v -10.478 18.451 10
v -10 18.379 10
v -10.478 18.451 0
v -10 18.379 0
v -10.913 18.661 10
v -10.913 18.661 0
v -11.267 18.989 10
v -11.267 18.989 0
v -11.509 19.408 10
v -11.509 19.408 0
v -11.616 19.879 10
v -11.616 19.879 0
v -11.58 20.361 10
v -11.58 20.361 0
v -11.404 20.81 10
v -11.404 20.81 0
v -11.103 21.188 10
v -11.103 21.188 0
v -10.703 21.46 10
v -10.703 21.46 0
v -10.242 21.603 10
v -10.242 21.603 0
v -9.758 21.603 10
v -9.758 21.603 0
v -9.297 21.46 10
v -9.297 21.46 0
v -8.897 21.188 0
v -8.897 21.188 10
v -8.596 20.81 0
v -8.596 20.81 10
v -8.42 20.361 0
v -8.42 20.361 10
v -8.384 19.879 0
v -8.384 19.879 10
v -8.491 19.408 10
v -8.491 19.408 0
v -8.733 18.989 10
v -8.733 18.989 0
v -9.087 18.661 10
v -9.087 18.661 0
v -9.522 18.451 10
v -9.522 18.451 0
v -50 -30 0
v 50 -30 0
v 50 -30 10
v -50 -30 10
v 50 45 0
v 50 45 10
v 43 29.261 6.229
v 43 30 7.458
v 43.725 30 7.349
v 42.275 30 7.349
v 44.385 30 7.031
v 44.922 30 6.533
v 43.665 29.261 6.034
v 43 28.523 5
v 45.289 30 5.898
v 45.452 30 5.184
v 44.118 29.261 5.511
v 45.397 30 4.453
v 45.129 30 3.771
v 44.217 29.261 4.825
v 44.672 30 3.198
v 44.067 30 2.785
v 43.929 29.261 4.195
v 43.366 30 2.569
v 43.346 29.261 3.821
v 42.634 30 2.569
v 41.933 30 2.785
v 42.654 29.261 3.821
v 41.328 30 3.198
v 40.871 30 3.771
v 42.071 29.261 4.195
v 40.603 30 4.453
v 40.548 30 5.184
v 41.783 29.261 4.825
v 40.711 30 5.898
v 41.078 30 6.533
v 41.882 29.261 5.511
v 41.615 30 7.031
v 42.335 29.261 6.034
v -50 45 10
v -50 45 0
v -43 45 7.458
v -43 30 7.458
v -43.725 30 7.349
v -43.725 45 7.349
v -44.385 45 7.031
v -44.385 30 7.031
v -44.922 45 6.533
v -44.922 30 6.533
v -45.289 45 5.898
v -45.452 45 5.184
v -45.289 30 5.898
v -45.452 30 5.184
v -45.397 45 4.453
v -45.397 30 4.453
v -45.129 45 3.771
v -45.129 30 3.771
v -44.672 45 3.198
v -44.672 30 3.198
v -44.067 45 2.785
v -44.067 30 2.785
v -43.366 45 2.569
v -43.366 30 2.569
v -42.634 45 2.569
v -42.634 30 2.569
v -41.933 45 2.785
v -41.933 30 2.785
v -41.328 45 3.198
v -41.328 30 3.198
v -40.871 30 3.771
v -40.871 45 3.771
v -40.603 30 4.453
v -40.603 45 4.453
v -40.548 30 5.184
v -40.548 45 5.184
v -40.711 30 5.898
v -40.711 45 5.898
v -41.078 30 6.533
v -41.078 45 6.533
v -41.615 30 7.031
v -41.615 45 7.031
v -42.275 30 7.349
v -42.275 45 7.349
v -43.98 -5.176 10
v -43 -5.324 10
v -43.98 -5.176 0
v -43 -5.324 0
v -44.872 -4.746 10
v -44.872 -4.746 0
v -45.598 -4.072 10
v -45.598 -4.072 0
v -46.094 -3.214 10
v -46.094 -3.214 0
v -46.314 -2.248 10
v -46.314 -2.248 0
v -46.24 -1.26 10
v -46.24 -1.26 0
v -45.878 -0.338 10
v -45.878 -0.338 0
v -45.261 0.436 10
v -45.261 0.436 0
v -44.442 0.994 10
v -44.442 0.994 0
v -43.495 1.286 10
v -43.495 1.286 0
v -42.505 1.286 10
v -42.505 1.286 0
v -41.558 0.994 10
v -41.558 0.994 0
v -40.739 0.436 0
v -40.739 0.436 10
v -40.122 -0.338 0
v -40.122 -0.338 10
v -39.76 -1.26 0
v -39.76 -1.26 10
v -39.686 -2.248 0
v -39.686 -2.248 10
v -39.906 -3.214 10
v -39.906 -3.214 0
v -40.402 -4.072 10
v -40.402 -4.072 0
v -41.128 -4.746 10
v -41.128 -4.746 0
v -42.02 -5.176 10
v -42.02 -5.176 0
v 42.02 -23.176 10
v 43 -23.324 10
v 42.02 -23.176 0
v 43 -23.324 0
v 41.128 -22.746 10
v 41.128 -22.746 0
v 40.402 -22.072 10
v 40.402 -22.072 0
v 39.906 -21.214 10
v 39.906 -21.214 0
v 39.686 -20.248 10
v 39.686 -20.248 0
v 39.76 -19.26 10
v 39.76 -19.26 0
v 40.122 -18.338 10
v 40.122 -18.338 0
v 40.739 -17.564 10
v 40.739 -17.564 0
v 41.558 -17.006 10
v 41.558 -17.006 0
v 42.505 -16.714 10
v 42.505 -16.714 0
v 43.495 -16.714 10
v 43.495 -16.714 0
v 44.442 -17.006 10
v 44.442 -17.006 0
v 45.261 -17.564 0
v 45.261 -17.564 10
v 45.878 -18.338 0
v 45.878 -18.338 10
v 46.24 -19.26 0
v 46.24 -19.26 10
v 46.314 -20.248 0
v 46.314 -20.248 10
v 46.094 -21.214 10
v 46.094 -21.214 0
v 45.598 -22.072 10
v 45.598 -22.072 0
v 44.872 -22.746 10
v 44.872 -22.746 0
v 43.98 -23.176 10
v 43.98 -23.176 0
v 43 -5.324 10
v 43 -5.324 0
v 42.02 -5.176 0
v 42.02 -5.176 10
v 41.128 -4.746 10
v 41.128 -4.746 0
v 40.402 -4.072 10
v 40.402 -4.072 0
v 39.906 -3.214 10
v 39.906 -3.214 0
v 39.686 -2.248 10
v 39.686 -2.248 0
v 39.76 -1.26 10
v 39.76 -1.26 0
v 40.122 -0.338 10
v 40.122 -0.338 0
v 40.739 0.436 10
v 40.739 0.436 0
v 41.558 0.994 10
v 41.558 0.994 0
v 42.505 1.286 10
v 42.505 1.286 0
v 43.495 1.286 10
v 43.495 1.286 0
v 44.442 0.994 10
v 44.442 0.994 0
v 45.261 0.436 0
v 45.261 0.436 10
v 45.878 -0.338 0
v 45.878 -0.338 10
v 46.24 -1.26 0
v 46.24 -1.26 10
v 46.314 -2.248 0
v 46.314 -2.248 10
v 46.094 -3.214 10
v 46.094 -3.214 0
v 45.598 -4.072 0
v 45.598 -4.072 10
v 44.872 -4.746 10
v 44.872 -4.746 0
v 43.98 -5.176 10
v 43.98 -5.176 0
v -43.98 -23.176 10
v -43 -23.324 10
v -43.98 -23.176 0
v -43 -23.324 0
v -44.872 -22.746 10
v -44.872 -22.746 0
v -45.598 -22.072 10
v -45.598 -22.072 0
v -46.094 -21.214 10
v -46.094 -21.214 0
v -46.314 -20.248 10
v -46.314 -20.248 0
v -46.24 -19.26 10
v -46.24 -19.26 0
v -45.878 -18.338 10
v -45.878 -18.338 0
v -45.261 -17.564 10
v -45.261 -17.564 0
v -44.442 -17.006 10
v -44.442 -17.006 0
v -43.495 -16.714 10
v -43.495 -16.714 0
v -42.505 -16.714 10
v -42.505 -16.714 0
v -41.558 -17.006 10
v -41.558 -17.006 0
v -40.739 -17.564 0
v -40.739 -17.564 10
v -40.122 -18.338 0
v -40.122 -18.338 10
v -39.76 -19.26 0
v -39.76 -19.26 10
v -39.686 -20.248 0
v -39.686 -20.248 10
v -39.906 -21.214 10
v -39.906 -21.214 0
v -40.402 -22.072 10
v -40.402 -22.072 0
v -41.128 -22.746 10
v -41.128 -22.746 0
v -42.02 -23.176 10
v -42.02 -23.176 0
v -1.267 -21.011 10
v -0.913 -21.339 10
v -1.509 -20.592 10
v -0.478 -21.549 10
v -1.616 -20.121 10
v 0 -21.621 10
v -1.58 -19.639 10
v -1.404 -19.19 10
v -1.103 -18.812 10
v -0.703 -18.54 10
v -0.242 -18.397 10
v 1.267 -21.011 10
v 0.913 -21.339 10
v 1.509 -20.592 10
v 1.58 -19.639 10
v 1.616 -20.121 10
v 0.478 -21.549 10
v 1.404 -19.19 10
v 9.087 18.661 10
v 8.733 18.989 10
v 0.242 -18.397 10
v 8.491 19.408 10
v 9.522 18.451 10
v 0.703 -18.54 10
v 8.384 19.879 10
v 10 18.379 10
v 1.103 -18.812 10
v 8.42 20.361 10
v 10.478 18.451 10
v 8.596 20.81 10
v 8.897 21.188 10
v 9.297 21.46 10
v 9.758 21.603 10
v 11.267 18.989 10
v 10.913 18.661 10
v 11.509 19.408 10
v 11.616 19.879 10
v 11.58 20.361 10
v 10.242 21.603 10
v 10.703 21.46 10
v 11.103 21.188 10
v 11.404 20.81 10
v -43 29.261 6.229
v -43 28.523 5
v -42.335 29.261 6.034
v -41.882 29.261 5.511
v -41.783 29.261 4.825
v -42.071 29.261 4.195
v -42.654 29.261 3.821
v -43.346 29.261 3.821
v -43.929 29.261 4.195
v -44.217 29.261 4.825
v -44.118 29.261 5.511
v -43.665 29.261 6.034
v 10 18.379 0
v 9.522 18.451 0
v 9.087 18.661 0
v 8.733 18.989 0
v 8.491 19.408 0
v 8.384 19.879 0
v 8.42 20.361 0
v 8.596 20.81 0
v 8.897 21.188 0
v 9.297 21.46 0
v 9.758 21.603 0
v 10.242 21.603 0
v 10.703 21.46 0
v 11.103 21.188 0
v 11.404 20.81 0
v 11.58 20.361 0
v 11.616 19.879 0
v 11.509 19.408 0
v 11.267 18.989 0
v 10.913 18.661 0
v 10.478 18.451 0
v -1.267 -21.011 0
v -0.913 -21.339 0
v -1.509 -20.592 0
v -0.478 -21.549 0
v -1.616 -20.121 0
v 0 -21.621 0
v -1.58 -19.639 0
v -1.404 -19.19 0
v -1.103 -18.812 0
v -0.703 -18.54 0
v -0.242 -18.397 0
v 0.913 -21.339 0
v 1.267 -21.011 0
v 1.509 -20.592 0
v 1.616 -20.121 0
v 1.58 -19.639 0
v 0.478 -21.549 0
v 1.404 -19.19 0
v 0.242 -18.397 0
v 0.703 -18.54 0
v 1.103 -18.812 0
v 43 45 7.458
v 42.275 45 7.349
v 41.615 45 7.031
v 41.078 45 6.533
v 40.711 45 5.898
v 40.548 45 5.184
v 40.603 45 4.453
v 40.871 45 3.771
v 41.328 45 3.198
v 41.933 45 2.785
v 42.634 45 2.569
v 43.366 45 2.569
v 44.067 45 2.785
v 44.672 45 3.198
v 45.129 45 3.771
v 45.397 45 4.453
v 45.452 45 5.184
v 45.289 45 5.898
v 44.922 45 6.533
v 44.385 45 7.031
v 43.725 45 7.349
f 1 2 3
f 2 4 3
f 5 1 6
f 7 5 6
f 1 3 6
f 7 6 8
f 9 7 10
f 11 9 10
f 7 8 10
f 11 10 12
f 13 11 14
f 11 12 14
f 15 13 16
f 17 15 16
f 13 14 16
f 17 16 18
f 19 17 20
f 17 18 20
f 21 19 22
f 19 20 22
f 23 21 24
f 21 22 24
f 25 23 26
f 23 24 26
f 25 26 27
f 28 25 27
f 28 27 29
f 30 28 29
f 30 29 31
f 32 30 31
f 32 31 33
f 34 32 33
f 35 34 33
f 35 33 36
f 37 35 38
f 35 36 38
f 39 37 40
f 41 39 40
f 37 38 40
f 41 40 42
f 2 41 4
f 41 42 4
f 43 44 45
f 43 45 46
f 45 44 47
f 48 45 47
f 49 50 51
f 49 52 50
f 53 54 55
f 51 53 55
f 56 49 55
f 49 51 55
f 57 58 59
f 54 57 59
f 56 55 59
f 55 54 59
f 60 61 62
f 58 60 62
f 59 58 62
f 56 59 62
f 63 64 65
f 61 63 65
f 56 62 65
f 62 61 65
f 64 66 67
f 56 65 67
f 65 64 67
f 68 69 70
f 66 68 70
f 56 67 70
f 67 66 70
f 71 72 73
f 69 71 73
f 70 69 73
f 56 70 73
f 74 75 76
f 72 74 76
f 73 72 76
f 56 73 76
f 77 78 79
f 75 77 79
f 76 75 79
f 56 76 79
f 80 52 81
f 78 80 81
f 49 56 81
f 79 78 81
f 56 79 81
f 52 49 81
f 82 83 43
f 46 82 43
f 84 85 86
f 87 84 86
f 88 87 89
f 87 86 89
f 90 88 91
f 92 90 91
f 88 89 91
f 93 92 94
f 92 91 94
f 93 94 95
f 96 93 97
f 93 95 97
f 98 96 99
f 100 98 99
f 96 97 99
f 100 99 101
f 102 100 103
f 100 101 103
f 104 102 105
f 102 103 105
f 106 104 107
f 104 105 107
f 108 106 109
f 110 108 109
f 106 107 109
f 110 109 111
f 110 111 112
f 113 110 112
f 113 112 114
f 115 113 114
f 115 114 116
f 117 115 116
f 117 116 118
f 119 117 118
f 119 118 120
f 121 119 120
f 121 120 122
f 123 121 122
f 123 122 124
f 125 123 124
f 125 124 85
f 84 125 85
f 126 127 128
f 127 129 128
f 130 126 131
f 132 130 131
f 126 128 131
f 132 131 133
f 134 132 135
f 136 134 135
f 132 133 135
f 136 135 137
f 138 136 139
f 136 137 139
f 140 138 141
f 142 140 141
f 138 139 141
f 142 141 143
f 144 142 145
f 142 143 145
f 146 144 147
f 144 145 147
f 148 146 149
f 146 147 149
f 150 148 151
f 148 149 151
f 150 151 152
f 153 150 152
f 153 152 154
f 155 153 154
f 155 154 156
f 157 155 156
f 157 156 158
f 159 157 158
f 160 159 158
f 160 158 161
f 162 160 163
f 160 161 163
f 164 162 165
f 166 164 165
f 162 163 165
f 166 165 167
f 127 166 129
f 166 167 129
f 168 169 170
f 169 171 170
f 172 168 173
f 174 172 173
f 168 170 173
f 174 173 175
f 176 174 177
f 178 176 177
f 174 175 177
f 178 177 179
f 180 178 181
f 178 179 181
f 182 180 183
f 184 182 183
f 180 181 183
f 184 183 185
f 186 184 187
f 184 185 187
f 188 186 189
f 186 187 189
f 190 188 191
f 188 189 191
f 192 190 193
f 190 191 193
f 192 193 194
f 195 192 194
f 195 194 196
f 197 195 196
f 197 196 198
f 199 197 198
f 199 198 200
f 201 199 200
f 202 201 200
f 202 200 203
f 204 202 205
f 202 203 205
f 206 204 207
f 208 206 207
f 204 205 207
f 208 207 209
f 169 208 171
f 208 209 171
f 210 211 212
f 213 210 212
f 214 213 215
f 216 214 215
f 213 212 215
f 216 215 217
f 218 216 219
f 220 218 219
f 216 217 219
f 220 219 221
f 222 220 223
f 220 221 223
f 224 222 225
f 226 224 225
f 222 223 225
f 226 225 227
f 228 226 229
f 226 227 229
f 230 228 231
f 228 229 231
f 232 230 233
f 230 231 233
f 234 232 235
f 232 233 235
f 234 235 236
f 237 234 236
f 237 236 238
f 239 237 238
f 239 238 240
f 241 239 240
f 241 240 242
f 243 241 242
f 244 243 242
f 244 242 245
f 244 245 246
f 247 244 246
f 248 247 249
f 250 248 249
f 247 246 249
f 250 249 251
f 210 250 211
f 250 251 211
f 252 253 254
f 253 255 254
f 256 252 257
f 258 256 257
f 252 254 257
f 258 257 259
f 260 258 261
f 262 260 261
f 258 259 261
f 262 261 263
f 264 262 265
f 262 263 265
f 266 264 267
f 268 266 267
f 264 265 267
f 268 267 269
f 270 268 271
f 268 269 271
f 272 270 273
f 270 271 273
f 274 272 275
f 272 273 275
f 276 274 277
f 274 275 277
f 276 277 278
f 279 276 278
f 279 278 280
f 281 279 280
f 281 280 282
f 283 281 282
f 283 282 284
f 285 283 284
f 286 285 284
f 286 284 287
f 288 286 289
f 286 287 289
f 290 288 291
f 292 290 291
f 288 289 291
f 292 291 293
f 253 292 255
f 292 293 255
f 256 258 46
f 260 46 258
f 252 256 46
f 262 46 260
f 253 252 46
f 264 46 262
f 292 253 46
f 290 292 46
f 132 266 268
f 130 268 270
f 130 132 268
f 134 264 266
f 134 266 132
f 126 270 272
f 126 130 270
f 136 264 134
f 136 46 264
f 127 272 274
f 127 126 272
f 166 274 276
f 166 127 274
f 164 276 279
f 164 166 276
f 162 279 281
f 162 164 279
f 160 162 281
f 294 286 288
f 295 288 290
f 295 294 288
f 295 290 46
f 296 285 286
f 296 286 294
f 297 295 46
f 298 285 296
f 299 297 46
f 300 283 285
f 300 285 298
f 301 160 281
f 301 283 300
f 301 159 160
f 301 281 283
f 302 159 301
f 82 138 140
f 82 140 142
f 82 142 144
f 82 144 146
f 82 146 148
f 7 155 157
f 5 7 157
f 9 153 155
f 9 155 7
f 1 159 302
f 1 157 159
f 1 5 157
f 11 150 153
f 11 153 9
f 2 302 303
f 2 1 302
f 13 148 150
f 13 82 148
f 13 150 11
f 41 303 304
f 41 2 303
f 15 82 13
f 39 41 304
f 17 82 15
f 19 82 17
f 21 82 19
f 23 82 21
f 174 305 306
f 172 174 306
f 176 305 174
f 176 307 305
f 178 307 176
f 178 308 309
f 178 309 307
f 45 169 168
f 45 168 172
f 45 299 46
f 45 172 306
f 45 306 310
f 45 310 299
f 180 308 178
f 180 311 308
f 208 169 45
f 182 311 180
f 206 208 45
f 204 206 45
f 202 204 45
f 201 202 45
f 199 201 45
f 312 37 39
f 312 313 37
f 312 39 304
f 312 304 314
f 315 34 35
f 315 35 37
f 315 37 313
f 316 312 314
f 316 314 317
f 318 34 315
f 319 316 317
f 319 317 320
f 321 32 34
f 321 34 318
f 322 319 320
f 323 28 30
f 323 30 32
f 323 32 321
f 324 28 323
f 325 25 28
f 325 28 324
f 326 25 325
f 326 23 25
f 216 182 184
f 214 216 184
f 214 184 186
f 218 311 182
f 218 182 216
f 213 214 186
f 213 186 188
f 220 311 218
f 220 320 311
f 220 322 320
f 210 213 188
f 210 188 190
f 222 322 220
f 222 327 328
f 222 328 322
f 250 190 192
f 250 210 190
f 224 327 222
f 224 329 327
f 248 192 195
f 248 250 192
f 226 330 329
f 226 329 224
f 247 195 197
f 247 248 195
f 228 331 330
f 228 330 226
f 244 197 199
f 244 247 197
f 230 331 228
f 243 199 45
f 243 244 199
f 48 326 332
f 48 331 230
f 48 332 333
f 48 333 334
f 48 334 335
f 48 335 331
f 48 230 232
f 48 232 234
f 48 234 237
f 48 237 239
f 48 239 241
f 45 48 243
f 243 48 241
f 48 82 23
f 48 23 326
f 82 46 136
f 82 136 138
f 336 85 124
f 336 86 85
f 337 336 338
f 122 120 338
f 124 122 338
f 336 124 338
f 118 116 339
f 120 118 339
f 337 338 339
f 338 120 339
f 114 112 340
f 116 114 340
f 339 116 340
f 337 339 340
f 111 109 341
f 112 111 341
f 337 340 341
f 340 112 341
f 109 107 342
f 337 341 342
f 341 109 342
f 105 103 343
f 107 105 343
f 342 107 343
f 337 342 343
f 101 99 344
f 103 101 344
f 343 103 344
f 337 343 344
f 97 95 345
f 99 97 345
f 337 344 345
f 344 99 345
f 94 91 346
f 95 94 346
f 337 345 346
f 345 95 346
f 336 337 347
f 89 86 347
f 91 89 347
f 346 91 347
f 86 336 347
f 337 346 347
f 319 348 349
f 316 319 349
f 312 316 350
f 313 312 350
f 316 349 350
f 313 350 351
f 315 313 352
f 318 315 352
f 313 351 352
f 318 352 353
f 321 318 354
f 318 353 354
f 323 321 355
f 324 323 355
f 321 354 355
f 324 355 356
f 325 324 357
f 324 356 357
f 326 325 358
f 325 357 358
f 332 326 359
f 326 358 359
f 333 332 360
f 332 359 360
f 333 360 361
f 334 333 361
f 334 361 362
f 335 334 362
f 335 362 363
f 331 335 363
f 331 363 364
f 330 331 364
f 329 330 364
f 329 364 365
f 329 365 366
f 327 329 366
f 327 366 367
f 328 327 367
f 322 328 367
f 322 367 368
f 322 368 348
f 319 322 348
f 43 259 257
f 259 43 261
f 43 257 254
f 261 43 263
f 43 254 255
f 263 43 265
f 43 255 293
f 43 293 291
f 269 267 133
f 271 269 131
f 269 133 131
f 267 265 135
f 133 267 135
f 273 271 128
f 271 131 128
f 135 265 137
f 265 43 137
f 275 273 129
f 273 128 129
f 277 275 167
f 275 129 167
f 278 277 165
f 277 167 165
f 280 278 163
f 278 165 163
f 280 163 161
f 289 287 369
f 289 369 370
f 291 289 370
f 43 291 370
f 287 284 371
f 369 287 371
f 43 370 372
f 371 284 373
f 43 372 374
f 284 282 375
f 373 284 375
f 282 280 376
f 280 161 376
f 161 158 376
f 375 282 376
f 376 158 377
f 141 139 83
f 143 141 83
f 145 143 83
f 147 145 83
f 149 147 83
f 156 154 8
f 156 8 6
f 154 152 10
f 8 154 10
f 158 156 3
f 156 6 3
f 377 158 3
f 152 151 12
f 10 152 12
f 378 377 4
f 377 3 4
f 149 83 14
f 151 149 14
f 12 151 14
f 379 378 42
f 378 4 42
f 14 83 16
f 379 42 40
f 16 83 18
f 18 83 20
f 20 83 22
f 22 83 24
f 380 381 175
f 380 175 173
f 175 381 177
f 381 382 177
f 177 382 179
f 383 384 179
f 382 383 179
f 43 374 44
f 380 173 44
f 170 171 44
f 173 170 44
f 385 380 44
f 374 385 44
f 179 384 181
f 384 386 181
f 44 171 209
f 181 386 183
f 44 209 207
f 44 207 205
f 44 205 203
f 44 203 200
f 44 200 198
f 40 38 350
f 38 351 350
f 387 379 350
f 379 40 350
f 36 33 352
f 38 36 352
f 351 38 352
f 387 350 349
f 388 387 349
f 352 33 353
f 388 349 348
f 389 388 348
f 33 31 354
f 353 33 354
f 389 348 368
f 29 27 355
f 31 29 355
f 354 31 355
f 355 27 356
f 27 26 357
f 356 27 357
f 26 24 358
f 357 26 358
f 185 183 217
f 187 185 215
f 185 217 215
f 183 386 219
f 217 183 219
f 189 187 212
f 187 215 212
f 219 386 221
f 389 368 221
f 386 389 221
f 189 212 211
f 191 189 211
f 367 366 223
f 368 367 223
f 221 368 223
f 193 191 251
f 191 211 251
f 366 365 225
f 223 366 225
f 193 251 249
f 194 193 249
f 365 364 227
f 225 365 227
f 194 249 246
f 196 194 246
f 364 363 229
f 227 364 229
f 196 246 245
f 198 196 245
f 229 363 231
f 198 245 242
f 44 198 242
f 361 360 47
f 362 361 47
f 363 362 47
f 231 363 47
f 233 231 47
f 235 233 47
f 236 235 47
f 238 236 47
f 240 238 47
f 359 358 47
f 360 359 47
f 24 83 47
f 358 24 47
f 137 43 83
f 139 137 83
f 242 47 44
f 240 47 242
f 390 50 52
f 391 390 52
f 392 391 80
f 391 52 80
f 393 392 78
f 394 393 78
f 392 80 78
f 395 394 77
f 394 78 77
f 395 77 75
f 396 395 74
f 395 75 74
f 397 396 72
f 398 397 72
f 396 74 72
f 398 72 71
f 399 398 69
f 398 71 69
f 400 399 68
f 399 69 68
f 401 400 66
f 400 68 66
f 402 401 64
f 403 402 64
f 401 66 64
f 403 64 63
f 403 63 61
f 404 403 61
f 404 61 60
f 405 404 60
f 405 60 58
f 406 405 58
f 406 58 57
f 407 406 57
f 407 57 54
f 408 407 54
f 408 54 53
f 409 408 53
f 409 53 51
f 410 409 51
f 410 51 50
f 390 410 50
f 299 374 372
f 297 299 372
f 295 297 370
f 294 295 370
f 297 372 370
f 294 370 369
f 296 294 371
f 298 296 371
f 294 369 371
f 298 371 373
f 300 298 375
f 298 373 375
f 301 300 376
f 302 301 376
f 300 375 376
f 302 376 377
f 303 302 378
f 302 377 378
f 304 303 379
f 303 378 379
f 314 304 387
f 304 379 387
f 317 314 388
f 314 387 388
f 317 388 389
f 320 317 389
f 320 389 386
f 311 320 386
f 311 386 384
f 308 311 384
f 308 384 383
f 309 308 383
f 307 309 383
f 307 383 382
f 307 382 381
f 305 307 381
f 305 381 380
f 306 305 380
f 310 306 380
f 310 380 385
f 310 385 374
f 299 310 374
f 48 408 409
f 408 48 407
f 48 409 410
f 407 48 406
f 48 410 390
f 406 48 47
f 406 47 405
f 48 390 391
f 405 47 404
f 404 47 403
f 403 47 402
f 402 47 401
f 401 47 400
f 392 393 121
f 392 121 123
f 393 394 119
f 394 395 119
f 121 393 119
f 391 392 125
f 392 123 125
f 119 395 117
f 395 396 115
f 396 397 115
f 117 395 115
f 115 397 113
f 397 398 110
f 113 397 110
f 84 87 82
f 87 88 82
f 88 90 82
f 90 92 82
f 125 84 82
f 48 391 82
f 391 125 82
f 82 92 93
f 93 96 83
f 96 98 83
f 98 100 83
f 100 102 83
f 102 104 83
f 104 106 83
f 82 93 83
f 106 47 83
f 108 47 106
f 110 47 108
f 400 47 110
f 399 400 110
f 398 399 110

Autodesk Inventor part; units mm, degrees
ref_plane "YZ Plane" through (0, 0, 0) normal (1, 0, 0) x (0, 1, 0)
ref_plane "XZ Plane" through (0, 0, 0) normal (0, 1, 0) x (-1, 0, 0)
ref_plane "XY Plane" through (0, 0, 0) normal (0, 0, 1) x (1, 0, 0)
sketch "Sketch1" plane through (0, 0, 0) normal (0, 0, 1) x (1, 0, 0)
  line L0 (50, -30) -> (-50, -30)
  line L1 (-50, -30) -> (-50, 30)
  line L2 (-50, 30) -> (50, 30)
  line L3 (50, 30) -> (50, -30)
  line L4 (50, -30) -> (-50, 30) construction
  line L5 (-50, -30) -> (50, 30) construction
  line L6 (-70, 0) -> (70, 0) projected
  line L7 (-50, 30) -> (50, 30)
  line L8 (50, 30) -> (50, 45)
  line L9 (50, 45) -> (-50, 45)
  line L10 (-50, 45) -> (-50, 30)
  point P0 (0, 0)
  dimension "d2" = 100
  dimension "d3" = 60
  dimension "d45" = 15
extrude "Extrusion1" add sketch "Sketch1" along normal blind 10 contours L0 L1 L6 L3 | L6 L1 L2 L3
sketch "Sketch2" plane through (0, 0, 10) normal (0, 0, 1) x (1, 0, 0)
  line L0 (-43, -20) -> (43, -20) construction
  line L1 (43, -20) -> (43, -2) construction
  line L2 (43, -2) -> (-43, -2) construction
  line L3 (-43, -2) -> (-43, -20) construction
  line L4 (-50, -30) -> (50, -30) construction
  line L5 (0, -42) -> (0, 42) construction
  point P0 (0, 0)
  dimension "d6" = 86
  dimension "d7" = 18
  dimension "d8" = 10
hole "Hole1" at (-43, -2, 10) at (43, -2, 10) at (43, -20, 10) at (-43, -20, 10) direction (0, 0, -1) diameter 6.647 end through all thread size "M8x1.25" class "6H" standard "ISO Metric profile"
sketch "Sketch3" plane through (0, 0, 10) normal (0, 0, 1) x (1, 0, 0)
  line L0 (50, 30) -> (-50, 30) projected
  line L1 (0, -42) -> (0, 42) projected
  point P0 (0, 0)
  point P1 (-10, 20)
  point P2 (10, 20)
  point P3 (0, -20)
  dimension "d16" = 10
  dimension "d17" = 10
  dimension "d18" = 40
hole "Hole4" at (-10, 20, 10) at (10, 20, 10) at (0, -20, 10) direction (0, 0, -1) diameter 3.242 end through all thread size "M4x0.7" class "6H" standard "ISO Metric profile"
extrude "Extrusion3" add sketch "Sketch1" along normal blind 10 contours L2 L10 L9 L8
sketch "Sketch5" plane through (-50, 45, 0) normal (0, 1, 0) x (1, 0, 0)
  line L0 (0, -10) -> (100, -10) construction
  line L1 (50, -10) -> (50, 0) construction
  line L2 (48.379, 0) -> (48.379, -10) construction
  point P0 (93, -5)
  point P1 (7, -5)
  dimension "d48" = 5
  dimension "d49" = 86
hole "Hole5" at (43, 45, 5) at (-43, 45, 5) direction (0, -1, 0) diameter 4.917 depth 15 tip angle 118 thread size "M6x1" class "6H" standard "ISO Metric profile"
properties part number "Lift_adaptor" material "Stainless Steel"
